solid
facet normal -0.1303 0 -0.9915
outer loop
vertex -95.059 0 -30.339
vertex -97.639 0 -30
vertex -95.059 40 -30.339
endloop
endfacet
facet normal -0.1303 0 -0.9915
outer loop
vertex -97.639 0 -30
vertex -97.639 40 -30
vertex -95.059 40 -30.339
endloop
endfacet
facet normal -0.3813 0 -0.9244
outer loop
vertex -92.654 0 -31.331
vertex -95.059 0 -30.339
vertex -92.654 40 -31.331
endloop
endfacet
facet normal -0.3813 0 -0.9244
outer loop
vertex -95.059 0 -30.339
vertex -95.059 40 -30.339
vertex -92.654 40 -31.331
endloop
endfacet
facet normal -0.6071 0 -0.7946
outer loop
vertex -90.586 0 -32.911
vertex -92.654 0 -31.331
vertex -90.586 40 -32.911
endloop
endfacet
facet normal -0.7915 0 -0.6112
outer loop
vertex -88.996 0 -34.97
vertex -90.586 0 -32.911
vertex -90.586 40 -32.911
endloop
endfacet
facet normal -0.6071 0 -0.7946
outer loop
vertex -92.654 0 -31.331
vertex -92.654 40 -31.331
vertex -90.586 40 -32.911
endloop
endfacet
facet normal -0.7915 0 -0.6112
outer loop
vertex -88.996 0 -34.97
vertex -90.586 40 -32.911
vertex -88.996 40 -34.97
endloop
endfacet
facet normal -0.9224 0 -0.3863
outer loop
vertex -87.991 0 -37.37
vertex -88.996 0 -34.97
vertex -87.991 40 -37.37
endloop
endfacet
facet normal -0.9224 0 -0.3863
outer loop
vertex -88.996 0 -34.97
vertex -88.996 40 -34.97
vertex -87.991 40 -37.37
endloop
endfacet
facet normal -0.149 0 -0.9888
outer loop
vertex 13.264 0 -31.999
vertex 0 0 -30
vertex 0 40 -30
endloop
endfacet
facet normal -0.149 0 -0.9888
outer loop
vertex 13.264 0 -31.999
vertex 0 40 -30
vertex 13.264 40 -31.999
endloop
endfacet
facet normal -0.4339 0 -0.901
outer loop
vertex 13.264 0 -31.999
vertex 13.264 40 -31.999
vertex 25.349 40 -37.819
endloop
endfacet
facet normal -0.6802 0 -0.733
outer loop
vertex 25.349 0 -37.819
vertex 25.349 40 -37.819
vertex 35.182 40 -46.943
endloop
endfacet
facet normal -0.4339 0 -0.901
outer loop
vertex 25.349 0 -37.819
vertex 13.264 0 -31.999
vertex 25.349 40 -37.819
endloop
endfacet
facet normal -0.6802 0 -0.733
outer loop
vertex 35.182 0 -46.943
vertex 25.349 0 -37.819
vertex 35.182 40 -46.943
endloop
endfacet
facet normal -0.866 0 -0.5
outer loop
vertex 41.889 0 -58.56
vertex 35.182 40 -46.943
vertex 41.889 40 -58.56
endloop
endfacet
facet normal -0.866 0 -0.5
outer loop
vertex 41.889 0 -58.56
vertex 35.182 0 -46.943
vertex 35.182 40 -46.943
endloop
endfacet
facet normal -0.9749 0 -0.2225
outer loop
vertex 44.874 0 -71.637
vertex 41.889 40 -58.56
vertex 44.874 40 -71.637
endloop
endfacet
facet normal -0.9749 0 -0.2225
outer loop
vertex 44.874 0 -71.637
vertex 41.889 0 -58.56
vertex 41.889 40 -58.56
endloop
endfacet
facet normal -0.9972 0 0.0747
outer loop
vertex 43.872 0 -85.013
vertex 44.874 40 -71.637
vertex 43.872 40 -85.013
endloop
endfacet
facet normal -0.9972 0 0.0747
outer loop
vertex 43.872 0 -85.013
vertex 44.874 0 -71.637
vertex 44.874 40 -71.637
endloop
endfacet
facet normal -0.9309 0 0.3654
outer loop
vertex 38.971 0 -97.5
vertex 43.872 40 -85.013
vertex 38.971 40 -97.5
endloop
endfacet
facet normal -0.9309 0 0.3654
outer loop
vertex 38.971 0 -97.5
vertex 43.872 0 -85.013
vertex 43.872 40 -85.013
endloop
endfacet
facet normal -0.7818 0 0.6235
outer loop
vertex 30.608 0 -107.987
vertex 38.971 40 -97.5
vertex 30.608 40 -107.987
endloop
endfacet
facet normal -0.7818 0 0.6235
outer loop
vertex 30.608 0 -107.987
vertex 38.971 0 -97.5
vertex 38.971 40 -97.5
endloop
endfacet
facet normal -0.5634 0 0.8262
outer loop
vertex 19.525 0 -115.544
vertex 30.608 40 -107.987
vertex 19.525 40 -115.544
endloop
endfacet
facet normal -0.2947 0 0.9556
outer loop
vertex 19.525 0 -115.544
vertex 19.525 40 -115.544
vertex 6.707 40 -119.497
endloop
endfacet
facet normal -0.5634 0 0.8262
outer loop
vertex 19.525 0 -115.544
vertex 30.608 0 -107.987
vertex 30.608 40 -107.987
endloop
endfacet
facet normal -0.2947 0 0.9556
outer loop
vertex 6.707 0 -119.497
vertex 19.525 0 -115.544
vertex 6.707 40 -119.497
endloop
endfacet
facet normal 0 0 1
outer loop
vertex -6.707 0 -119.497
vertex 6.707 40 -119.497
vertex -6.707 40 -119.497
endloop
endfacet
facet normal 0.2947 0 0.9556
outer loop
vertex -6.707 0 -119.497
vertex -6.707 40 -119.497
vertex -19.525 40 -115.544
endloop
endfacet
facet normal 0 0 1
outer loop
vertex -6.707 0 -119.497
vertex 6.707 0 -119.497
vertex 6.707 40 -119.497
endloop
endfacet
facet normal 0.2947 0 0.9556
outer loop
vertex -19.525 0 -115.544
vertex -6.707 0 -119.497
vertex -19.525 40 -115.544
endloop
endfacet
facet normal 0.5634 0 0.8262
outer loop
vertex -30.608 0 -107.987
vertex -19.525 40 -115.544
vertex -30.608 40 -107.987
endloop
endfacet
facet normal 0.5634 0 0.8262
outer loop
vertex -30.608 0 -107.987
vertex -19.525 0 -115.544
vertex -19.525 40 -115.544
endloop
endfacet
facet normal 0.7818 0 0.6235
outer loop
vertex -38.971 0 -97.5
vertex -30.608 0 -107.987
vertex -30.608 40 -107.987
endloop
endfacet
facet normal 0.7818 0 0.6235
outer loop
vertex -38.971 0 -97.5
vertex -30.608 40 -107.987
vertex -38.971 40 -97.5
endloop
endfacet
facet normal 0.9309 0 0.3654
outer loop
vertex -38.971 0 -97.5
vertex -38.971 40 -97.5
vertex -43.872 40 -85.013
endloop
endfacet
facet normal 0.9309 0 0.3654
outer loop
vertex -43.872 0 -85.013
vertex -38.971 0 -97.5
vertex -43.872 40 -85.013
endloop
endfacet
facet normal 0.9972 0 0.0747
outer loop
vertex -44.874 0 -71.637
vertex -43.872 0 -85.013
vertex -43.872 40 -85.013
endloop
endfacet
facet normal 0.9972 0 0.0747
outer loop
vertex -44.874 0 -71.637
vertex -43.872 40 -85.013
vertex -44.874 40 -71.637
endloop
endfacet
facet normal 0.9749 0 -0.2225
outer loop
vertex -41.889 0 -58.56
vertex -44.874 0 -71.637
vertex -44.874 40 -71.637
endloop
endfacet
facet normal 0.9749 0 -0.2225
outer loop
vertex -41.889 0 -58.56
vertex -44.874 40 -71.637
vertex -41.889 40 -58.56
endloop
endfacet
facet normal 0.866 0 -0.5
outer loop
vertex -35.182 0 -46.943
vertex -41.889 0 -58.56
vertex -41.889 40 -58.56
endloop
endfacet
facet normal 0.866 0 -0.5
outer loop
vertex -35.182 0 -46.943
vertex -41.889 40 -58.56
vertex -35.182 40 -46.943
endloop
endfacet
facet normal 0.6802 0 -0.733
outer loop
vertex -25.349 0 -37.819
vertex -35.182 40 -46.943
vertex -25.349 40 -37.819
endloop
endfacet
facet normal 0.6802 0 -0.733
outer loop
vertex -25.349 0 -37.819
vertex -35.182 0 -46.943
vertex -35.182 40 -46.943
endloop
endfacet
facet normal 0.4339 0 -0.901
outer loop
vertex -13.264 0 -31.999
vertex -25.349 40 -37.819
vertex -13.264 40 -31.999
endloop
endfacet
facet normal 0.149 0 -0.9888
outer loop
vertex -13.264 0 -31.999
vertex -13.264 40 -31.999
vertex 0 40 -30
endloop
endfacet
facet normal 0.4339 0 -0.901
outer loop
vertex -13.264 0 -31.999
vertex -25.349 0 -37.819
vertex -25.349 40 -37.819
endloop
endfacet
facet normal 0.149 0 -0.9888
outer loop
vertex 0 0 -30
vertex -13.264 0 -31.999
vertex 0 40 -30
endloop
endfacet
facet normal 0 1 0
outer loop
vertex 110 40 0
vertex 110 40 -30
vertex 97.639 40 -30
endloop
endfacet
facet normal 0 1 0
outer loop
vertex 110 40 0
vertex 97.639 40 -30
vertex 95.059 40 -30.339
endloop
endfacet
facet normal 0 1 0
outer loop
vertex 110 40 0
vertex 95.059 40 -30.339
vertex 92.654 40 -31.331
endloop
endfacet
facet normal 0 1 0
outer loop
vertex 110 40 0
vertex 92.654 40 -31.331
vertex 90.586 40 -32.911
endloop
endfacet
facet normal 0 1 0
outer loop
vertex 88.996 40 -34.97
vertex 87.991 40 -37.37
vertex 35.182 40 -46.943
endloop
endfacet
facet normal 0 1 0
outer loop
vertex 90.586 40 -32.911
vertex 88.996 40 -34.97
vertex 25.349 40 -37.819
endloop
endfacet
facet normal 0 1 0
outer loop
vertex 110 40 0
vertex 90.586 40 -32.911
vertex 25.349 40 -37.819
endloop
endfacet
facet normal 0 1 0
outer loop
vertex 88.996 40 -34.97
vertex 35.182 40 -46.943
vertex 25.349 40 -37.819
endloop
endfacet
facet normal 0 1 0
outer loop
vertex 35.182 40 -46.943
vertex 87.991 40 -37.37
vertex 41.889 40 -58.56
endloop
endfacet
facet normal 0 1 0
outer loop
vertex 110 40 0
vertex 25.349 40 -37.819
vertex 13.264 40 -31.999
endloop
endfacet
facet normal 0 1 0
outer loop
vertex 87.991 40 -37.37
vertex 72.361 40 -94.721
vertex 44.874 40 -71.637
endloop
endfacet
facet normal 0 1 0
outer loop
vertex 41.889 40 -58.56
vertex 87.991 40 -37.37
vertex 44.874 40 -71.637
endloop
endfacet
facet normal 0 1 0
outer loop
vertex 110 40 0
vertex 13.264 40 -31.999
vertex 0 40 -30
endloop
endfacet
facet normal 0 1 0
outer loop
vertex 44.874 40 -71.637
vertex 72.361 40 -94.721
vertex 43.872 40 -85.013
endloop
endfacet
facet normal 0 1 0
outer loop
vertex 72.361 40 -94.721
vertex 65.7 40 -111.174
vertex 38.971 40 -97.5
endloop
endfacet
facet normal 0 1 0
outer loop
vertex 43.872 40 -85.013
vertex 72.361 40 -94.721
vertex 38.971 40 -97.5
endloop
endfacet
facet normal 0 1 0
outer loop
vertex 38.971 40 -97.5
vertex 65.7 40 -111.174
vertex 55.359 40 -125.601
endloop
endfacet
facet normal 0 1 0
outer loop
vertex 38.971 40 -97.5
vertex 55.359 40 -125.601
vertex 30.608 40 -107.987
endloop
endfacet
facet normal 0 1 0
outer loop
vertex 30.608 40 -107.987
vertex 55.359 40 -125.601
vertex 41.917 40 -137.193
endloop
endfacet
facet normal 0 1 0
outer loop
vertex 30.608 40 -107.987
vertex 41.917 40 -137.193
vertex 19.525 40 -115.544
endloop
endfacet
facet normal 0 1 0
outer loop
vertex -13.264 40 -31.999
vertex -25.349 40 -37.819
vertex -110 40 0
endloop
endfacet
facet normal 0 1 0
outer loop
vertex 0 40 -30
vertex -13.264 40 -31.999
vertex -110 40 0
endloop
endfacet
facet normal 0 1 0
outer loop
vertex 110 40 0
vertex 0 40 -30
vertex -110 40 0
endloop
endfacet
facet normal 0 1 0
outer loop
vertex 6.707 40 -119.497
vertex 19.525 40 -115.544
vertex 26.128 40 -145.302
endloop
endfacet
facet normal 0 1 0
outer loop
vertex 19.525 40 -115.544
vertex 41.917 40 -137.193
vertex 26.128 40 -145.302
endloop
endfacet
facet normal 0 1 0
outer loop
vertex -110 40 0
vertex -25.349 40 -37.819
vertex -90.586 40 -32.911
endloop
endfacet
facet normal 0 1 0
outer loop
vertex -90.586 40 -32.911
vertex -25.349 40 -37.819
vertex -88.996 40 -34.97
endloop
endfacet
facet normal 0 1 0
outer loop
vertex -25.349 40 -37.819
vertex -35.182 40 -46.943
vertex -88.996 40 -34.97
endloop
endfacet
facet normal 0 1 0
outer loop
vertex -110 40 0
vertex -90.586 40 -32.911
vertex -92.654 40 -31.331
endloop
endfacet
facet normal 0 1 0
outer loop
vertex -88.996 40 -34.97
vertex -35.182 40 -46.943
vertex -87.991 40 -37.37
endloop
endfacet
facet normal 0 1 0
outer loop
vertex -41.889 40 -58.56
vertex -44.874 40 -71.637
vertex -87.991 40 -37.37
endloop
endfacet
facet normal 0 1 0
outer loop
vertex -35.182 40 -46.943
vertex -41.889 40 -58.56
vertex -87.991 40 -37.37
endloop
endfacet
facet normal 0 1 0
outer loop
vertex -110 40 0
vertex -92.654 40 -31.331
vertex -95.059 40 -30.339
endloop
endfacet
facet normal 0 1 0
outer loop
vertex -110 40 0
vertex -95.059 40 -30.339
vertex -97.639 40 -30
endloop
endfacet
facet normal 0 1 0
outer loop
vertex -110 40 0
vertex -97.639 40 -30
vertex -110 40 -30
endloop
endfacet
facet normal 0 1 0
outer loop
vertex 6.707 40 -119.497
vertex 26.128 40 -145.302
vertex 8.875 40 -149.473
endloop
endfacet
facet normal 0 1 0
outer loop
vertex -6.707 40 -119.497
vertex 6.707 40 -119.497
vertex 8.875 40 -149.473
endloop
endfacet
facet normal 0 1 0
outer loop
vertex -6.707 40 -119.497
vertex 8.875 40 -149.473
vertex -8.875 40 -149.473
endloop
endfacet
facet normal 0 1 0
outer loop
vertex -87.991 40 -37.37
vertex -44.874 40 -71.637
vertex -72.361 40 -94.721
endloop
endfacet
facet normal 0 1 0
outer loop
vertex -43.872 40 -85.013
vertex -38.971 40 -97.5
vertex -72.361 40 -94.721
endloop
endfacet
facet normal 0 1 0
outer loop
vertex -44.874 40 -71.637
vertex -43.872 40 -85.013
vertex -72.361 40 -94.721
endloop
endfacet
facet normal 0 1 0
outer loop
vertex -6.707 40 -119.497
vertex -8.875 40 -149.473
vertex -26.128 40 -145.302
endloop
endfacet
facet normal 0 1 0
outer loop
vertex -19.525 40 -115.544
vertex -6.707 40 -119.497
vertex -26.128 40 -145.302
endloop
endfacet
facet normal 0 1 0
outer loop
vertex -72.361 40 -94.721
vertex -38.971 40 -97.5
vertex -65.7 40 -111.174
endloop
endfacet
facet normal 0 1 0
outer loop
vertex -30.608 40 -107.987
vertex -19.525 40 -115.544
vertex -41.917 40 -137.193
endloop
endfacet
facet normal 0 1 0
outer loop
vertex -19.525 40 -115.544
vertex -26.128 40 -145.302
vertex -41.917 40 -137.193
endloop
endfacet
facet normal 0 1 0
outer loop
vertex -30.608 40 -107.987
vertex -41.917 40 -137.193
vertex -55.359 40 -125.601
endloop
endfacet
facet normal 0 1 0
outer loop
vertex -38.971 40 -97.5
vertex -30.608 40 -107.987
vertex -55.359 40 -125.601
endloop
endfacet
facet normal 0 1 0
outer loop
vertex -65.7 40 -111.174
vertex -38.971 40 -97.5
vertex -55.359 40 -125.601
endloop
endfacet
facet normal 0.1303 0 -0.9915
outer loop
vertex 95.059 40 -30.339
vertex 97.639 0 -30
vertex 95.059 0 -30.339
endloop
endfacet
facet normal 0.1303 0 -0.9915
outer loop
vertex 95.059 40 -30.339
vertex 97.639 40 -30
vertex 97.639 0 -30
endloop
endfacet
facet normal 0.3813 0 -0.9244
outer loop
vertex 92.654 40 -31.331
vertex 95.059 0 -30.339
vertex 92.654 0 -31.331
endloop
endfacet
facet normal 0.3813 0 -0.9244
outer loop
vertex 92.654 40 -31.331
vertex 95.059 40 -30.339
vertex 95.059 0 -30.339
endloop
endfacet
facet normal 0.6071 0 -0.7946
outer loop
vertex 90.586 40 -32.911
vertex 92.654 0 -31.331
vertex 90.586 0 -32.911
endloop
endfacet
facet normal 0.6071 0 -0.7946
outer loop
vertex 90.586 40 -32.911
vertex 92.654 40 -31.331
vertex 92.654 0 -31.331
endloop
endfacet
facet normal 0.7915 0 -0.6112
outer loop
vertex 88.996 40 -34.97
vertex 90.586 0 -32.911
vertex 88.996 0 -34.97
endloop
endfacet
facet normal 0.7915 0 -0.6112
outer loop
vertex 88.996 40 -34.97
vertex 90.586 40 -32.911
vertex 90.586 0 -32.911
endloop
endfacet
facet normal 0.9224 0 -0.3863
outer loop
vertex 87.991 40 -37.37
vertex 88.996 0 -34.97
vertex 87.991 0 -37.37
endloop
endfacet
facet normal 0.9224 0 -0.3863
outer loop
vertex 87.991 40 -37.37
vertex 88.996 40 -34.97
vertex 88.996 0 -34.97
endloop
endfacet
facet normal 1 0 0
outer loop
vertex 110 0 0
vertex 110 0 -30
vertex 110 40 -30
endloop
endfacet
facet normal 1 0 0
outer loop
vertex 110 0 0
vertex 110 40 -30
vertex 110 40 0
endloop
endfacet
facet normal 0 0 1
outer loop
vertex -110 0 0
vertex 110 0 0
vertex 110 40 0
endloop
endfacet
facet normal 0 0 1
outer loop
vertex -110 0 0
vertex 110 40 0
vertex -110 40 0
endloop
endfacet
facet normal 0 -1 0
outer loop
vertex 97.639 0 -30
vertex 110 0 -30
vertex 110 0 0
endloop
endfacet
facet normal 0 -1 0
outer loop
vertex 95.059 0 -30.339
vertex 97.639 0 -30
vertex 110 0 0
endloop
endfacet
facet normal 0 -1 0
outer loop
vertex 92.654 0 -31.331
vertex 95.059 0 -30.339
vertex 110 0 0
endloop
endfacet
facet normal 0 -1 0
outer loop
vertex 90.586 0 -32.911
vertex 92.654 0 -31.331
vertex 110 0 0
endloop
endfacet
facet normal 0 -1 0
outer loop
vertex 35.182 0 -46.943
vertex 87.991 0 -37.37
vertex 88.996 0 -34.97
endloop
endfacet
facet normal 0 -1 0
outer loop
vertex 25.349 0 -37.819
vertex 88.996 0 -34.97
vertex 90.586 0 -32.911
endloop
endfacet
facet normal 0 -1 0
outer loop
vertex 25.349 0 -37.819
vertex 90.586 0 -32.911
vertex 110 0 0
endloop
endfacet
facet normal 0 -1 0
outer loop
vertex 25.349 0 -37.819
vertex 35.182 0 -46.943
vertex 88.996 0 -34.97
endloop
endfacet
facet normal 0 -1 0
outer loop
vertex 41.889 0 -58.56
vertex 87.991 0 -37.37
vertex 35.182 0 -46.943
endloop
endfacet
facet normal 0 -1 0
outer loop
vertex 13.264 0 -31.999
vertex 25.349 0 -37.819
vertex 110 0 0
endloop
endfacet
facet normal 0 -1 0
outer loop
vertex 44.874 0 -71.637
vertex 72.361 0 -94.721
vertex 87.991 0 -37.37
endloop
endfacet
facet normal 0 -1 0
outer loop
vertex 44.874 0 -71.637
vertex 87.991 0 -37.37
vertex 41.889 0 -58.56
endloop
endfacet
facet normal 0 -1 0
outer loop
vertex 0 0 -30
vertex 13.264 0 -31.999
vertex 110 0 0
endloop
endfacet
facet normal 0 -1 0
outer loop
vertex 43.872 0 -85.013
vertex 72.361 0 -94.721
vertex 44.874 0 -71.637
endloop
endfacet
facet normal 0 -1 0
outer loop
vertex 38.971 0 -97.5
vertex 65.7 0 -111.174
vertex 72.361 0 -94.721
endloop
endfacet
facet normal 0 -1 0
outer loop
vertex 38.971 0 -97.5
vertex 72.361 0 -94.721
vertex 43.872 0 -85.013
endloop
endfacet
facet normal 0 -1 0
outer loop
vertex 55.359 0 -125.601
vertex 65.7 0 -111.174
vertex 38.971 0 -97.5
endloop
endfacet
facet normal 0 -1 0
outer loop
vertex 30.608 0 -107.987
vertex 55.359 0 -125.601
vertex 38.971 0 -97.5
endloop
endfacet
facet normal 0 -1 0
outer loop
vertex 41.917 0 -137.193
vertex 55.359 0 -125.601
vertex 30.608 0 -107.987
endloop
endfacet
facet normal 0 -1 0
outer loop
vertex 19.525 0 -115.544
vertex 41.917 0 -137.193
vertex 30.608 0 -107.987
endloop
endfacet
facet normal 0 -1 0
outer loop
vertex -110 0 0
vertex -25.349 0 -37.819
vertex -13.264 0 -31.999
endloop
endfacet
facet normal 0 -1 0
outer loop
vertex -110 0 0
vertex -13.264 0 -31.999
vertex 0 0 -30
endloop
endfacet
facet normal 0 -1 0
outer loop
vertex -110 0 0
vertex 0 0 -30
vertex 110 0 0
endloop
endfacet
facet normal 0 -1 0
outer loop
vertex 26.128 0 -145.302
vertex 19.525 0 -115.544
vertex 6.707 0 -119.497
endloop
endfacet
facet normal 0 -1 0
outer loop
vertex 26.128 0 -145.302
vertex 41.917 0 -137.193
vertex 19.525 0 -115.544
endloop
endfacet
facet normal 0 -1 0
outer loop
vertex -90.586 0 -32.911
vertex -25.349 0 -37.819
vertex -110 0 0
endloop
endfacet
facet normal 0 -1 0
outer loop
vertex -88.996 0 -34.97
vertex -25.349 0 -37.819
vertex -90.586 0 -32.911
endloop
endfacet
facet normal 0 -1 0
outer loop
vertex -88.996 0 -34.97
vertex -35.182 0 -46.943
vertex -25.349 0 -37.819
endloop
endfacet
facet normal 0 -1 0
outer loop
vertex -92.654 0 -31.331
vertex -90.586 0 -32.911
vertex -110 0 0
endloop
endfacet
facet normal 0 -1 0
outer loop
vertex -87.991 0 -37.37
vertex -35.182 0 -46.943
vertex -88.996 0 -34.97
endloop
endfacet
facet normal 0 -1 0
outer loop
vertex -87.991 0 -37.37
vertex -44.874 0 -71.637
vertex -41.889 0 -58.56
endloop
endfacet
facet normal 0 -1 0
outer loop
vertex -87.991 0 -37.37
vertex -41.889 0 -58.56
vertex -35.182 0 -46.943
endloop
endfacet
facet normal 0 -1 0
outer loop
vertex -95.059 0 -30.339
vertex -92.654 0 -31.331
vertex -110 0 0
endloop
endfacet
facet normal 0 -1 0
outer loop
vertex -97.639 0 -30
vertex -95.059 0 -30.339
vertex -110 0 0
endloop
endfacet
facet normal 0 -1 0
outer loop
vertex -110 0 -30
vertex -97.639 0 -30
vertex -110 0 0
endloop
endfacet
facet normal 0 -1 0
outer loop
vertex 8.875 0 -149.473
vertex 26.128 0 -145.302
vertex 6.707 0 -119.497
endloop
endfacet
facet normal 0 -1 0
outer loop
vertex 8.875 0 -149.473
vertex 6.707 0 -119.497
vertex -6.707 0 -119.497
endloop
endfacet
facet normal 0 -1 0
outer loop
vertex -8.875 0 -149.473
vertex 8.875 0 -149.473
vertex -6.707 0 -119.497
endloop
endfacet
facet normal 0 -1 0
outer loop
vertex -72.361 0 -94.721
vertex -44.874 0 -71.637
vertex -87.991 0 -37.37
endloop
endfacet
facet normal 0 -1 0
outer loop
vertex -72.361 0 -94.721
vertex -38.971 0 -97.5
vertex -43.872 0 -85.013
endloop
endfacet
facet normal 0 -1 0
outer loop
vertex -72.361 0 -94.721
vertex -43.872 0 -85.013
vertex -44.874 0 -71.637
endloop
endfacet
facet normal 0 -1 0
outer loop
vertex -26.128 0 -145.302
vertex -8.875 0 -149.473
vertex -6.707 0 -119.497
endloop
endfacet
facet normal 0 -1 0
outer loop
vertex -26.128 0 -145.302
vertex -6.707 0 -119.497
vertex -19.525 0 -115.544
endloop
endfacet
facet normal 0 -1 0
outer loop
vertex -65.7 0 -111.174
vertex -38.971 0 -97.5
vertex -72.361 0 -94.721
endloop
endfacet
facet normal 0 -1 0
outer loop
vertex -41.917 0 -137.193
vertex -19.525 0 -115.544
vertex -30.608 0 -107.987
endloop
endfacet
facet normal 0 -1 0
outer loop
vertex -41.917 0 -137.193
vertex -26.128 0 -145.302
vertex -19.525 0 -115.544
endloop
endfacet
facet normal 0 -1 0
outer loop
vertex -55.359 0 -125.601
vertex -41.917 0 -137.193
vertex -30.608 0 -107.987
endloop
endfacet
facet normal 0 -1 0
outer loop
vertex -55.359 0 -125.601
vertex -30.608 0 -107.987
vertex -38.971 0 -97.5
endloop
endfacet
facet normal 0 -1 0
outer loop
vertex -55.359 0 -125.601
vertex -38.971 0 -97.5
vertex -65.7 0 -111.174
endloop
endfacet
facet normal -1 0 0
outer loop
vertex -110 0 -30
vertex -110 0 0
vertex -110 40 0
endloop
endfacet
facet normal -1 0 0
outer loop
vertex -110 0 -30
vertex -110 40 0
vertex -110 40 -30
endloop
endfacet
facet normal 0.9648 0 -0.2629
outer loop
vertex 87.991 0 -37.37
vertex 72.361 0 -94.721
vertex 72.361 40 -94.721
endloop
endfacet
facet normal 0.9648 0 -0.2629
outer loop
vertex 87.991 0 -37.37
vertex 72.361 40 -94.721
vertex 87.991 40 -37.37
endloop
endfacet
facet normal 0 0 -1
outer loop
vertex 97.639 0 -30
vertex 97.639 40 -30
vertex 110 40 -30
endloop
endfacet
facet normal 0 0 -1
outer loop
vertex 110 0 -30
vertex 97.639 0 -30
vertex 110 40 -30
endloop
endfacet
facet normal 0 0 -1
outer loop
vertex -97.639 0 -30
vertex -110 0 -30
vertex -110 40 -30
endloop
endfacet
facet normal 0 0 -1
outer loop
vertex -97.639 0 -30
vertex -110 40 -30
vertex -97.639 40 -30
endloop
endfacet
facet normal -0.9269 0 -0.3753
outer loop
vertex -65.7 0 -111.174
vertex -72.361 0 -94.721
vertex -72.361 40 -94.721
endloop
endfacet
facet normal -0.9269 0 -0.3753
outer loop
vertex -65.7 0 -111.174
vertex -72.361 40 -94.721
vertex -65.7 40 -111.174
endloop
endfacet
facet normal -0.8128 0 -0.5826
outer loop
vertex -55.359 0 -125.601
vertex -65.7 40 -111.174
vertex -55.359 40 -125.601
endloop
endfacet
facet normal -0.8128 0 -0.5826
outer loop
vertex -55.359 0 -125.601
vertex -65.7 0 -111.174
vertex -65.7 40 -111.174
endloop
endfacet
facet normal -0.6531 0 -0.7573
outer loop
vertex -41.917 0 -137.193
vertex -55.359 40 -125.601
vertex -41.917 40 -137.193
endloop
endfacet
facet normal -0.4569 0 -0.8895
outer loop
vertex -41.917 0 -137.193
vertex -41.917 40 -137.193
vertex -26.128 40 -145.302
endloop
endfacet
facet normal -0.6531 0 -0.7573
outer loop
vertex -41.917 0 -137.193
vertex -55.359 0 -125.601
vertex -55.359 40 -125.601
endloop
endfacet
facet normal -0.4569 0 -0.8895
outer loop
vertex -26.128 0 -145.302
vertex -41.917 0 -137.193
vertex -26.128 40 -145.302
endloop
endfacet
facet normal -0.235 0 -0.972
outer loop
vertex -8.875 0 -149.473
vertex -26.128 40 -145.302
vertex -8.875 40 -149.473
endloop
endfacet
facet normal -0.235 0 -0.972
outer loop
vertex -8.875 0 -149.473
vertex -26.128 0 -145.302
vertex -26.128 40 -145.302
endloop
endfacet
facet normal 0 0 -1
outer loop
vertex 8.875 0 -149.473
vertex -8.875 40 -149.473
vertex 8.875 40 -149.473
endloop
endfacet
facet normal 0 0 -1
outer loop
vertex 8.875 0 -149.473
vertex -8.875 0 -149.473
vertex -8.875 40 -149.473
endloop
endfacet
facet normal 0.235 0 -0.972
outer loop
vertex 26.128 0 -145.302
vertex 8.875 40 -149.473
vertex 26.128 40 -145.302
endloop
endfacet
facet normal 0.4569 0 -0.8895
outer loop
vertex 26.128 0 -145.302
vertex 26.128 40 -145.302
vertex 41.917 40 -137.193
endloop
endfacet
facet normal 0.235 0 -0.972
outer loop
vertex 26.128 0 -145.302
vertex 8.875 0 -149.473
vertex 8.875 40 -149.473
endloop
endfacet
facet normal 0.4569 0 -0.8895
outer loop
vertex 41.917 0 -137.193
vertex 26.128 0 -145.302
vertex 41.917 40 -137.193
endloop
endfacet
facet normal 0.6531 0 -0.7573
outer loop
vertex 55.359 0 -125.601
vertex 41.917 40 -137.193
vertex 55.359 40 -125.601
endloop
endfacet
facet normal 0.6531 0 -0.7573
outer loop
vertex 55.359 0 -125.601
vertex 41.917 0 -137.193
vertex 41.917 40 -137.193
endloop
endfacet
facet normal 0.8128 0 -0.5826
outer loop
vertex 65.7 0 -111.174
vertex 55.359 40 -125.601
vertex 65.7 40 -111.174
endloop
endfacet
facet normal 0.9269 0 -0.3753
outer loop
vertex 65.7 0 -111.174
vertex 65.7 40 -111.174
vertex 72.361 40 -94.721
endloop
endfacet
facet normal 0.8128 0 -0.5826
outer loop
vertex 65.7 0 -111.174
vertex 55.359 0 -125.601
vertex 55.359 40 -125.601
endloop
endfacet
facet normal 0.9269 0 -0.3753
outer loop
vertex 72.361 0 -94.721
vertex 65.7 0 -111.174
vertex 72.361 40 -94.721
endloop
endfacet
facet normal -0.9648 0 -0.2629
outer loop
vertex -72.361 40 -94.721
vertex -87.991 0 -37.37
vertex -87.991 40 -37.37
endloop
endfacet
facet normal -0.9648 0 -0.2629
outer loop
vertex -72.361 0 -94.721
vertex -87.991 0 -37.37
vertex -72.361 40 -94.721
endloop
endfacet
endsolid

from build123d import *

# Parameters (mm, degrees)
SKETCH_1_R      = 45
EXTRUDE_1_DEPTH = 40
FILLET_1_R      = 10


with BuildPart() as part:
    # 草图1 → 凸台-拉伸1 (new body)
    with BuildSketch(Plane(origin=(0, 0, 0), x_dir=(1, 0, 0), z_dir=(0, 1, 0))):
        with BuildLine():
            Line((110, 0), (-110, 0))
            Line((-110, 0), (-110, 30))
            Line((-110, 30), (-90, 30))
            Line((-90, 30), (-72.360679775, 94.72135955))
            ThreePointArc((-72.360679775, 94.72135955), (0, 150), (72.360679775, 94.72135955))
            Line((72.360679775, 94.72135955), (90, 30))
            Line((90, 30), (110, 30))
            Line((110, 30), (110, 0))
        make_face()
        with Locations(Location((0, 75, 0), (0, 0, 270))):
            Circle(SKETCH_1_R, mode=Mode.SUBTRACT)
    extrude(amount=EXTRUDE_1_DEPTH)

    # 圆角1
    fillet_1_edges = [part.edges().sort_by_distance(p)[0] for p in [
        (-90, 20, -30),
        (90, 20, -30),
    ]]
    fillet(fillet_1_edges, radius=FILLET_1_R)


solid = part.part
